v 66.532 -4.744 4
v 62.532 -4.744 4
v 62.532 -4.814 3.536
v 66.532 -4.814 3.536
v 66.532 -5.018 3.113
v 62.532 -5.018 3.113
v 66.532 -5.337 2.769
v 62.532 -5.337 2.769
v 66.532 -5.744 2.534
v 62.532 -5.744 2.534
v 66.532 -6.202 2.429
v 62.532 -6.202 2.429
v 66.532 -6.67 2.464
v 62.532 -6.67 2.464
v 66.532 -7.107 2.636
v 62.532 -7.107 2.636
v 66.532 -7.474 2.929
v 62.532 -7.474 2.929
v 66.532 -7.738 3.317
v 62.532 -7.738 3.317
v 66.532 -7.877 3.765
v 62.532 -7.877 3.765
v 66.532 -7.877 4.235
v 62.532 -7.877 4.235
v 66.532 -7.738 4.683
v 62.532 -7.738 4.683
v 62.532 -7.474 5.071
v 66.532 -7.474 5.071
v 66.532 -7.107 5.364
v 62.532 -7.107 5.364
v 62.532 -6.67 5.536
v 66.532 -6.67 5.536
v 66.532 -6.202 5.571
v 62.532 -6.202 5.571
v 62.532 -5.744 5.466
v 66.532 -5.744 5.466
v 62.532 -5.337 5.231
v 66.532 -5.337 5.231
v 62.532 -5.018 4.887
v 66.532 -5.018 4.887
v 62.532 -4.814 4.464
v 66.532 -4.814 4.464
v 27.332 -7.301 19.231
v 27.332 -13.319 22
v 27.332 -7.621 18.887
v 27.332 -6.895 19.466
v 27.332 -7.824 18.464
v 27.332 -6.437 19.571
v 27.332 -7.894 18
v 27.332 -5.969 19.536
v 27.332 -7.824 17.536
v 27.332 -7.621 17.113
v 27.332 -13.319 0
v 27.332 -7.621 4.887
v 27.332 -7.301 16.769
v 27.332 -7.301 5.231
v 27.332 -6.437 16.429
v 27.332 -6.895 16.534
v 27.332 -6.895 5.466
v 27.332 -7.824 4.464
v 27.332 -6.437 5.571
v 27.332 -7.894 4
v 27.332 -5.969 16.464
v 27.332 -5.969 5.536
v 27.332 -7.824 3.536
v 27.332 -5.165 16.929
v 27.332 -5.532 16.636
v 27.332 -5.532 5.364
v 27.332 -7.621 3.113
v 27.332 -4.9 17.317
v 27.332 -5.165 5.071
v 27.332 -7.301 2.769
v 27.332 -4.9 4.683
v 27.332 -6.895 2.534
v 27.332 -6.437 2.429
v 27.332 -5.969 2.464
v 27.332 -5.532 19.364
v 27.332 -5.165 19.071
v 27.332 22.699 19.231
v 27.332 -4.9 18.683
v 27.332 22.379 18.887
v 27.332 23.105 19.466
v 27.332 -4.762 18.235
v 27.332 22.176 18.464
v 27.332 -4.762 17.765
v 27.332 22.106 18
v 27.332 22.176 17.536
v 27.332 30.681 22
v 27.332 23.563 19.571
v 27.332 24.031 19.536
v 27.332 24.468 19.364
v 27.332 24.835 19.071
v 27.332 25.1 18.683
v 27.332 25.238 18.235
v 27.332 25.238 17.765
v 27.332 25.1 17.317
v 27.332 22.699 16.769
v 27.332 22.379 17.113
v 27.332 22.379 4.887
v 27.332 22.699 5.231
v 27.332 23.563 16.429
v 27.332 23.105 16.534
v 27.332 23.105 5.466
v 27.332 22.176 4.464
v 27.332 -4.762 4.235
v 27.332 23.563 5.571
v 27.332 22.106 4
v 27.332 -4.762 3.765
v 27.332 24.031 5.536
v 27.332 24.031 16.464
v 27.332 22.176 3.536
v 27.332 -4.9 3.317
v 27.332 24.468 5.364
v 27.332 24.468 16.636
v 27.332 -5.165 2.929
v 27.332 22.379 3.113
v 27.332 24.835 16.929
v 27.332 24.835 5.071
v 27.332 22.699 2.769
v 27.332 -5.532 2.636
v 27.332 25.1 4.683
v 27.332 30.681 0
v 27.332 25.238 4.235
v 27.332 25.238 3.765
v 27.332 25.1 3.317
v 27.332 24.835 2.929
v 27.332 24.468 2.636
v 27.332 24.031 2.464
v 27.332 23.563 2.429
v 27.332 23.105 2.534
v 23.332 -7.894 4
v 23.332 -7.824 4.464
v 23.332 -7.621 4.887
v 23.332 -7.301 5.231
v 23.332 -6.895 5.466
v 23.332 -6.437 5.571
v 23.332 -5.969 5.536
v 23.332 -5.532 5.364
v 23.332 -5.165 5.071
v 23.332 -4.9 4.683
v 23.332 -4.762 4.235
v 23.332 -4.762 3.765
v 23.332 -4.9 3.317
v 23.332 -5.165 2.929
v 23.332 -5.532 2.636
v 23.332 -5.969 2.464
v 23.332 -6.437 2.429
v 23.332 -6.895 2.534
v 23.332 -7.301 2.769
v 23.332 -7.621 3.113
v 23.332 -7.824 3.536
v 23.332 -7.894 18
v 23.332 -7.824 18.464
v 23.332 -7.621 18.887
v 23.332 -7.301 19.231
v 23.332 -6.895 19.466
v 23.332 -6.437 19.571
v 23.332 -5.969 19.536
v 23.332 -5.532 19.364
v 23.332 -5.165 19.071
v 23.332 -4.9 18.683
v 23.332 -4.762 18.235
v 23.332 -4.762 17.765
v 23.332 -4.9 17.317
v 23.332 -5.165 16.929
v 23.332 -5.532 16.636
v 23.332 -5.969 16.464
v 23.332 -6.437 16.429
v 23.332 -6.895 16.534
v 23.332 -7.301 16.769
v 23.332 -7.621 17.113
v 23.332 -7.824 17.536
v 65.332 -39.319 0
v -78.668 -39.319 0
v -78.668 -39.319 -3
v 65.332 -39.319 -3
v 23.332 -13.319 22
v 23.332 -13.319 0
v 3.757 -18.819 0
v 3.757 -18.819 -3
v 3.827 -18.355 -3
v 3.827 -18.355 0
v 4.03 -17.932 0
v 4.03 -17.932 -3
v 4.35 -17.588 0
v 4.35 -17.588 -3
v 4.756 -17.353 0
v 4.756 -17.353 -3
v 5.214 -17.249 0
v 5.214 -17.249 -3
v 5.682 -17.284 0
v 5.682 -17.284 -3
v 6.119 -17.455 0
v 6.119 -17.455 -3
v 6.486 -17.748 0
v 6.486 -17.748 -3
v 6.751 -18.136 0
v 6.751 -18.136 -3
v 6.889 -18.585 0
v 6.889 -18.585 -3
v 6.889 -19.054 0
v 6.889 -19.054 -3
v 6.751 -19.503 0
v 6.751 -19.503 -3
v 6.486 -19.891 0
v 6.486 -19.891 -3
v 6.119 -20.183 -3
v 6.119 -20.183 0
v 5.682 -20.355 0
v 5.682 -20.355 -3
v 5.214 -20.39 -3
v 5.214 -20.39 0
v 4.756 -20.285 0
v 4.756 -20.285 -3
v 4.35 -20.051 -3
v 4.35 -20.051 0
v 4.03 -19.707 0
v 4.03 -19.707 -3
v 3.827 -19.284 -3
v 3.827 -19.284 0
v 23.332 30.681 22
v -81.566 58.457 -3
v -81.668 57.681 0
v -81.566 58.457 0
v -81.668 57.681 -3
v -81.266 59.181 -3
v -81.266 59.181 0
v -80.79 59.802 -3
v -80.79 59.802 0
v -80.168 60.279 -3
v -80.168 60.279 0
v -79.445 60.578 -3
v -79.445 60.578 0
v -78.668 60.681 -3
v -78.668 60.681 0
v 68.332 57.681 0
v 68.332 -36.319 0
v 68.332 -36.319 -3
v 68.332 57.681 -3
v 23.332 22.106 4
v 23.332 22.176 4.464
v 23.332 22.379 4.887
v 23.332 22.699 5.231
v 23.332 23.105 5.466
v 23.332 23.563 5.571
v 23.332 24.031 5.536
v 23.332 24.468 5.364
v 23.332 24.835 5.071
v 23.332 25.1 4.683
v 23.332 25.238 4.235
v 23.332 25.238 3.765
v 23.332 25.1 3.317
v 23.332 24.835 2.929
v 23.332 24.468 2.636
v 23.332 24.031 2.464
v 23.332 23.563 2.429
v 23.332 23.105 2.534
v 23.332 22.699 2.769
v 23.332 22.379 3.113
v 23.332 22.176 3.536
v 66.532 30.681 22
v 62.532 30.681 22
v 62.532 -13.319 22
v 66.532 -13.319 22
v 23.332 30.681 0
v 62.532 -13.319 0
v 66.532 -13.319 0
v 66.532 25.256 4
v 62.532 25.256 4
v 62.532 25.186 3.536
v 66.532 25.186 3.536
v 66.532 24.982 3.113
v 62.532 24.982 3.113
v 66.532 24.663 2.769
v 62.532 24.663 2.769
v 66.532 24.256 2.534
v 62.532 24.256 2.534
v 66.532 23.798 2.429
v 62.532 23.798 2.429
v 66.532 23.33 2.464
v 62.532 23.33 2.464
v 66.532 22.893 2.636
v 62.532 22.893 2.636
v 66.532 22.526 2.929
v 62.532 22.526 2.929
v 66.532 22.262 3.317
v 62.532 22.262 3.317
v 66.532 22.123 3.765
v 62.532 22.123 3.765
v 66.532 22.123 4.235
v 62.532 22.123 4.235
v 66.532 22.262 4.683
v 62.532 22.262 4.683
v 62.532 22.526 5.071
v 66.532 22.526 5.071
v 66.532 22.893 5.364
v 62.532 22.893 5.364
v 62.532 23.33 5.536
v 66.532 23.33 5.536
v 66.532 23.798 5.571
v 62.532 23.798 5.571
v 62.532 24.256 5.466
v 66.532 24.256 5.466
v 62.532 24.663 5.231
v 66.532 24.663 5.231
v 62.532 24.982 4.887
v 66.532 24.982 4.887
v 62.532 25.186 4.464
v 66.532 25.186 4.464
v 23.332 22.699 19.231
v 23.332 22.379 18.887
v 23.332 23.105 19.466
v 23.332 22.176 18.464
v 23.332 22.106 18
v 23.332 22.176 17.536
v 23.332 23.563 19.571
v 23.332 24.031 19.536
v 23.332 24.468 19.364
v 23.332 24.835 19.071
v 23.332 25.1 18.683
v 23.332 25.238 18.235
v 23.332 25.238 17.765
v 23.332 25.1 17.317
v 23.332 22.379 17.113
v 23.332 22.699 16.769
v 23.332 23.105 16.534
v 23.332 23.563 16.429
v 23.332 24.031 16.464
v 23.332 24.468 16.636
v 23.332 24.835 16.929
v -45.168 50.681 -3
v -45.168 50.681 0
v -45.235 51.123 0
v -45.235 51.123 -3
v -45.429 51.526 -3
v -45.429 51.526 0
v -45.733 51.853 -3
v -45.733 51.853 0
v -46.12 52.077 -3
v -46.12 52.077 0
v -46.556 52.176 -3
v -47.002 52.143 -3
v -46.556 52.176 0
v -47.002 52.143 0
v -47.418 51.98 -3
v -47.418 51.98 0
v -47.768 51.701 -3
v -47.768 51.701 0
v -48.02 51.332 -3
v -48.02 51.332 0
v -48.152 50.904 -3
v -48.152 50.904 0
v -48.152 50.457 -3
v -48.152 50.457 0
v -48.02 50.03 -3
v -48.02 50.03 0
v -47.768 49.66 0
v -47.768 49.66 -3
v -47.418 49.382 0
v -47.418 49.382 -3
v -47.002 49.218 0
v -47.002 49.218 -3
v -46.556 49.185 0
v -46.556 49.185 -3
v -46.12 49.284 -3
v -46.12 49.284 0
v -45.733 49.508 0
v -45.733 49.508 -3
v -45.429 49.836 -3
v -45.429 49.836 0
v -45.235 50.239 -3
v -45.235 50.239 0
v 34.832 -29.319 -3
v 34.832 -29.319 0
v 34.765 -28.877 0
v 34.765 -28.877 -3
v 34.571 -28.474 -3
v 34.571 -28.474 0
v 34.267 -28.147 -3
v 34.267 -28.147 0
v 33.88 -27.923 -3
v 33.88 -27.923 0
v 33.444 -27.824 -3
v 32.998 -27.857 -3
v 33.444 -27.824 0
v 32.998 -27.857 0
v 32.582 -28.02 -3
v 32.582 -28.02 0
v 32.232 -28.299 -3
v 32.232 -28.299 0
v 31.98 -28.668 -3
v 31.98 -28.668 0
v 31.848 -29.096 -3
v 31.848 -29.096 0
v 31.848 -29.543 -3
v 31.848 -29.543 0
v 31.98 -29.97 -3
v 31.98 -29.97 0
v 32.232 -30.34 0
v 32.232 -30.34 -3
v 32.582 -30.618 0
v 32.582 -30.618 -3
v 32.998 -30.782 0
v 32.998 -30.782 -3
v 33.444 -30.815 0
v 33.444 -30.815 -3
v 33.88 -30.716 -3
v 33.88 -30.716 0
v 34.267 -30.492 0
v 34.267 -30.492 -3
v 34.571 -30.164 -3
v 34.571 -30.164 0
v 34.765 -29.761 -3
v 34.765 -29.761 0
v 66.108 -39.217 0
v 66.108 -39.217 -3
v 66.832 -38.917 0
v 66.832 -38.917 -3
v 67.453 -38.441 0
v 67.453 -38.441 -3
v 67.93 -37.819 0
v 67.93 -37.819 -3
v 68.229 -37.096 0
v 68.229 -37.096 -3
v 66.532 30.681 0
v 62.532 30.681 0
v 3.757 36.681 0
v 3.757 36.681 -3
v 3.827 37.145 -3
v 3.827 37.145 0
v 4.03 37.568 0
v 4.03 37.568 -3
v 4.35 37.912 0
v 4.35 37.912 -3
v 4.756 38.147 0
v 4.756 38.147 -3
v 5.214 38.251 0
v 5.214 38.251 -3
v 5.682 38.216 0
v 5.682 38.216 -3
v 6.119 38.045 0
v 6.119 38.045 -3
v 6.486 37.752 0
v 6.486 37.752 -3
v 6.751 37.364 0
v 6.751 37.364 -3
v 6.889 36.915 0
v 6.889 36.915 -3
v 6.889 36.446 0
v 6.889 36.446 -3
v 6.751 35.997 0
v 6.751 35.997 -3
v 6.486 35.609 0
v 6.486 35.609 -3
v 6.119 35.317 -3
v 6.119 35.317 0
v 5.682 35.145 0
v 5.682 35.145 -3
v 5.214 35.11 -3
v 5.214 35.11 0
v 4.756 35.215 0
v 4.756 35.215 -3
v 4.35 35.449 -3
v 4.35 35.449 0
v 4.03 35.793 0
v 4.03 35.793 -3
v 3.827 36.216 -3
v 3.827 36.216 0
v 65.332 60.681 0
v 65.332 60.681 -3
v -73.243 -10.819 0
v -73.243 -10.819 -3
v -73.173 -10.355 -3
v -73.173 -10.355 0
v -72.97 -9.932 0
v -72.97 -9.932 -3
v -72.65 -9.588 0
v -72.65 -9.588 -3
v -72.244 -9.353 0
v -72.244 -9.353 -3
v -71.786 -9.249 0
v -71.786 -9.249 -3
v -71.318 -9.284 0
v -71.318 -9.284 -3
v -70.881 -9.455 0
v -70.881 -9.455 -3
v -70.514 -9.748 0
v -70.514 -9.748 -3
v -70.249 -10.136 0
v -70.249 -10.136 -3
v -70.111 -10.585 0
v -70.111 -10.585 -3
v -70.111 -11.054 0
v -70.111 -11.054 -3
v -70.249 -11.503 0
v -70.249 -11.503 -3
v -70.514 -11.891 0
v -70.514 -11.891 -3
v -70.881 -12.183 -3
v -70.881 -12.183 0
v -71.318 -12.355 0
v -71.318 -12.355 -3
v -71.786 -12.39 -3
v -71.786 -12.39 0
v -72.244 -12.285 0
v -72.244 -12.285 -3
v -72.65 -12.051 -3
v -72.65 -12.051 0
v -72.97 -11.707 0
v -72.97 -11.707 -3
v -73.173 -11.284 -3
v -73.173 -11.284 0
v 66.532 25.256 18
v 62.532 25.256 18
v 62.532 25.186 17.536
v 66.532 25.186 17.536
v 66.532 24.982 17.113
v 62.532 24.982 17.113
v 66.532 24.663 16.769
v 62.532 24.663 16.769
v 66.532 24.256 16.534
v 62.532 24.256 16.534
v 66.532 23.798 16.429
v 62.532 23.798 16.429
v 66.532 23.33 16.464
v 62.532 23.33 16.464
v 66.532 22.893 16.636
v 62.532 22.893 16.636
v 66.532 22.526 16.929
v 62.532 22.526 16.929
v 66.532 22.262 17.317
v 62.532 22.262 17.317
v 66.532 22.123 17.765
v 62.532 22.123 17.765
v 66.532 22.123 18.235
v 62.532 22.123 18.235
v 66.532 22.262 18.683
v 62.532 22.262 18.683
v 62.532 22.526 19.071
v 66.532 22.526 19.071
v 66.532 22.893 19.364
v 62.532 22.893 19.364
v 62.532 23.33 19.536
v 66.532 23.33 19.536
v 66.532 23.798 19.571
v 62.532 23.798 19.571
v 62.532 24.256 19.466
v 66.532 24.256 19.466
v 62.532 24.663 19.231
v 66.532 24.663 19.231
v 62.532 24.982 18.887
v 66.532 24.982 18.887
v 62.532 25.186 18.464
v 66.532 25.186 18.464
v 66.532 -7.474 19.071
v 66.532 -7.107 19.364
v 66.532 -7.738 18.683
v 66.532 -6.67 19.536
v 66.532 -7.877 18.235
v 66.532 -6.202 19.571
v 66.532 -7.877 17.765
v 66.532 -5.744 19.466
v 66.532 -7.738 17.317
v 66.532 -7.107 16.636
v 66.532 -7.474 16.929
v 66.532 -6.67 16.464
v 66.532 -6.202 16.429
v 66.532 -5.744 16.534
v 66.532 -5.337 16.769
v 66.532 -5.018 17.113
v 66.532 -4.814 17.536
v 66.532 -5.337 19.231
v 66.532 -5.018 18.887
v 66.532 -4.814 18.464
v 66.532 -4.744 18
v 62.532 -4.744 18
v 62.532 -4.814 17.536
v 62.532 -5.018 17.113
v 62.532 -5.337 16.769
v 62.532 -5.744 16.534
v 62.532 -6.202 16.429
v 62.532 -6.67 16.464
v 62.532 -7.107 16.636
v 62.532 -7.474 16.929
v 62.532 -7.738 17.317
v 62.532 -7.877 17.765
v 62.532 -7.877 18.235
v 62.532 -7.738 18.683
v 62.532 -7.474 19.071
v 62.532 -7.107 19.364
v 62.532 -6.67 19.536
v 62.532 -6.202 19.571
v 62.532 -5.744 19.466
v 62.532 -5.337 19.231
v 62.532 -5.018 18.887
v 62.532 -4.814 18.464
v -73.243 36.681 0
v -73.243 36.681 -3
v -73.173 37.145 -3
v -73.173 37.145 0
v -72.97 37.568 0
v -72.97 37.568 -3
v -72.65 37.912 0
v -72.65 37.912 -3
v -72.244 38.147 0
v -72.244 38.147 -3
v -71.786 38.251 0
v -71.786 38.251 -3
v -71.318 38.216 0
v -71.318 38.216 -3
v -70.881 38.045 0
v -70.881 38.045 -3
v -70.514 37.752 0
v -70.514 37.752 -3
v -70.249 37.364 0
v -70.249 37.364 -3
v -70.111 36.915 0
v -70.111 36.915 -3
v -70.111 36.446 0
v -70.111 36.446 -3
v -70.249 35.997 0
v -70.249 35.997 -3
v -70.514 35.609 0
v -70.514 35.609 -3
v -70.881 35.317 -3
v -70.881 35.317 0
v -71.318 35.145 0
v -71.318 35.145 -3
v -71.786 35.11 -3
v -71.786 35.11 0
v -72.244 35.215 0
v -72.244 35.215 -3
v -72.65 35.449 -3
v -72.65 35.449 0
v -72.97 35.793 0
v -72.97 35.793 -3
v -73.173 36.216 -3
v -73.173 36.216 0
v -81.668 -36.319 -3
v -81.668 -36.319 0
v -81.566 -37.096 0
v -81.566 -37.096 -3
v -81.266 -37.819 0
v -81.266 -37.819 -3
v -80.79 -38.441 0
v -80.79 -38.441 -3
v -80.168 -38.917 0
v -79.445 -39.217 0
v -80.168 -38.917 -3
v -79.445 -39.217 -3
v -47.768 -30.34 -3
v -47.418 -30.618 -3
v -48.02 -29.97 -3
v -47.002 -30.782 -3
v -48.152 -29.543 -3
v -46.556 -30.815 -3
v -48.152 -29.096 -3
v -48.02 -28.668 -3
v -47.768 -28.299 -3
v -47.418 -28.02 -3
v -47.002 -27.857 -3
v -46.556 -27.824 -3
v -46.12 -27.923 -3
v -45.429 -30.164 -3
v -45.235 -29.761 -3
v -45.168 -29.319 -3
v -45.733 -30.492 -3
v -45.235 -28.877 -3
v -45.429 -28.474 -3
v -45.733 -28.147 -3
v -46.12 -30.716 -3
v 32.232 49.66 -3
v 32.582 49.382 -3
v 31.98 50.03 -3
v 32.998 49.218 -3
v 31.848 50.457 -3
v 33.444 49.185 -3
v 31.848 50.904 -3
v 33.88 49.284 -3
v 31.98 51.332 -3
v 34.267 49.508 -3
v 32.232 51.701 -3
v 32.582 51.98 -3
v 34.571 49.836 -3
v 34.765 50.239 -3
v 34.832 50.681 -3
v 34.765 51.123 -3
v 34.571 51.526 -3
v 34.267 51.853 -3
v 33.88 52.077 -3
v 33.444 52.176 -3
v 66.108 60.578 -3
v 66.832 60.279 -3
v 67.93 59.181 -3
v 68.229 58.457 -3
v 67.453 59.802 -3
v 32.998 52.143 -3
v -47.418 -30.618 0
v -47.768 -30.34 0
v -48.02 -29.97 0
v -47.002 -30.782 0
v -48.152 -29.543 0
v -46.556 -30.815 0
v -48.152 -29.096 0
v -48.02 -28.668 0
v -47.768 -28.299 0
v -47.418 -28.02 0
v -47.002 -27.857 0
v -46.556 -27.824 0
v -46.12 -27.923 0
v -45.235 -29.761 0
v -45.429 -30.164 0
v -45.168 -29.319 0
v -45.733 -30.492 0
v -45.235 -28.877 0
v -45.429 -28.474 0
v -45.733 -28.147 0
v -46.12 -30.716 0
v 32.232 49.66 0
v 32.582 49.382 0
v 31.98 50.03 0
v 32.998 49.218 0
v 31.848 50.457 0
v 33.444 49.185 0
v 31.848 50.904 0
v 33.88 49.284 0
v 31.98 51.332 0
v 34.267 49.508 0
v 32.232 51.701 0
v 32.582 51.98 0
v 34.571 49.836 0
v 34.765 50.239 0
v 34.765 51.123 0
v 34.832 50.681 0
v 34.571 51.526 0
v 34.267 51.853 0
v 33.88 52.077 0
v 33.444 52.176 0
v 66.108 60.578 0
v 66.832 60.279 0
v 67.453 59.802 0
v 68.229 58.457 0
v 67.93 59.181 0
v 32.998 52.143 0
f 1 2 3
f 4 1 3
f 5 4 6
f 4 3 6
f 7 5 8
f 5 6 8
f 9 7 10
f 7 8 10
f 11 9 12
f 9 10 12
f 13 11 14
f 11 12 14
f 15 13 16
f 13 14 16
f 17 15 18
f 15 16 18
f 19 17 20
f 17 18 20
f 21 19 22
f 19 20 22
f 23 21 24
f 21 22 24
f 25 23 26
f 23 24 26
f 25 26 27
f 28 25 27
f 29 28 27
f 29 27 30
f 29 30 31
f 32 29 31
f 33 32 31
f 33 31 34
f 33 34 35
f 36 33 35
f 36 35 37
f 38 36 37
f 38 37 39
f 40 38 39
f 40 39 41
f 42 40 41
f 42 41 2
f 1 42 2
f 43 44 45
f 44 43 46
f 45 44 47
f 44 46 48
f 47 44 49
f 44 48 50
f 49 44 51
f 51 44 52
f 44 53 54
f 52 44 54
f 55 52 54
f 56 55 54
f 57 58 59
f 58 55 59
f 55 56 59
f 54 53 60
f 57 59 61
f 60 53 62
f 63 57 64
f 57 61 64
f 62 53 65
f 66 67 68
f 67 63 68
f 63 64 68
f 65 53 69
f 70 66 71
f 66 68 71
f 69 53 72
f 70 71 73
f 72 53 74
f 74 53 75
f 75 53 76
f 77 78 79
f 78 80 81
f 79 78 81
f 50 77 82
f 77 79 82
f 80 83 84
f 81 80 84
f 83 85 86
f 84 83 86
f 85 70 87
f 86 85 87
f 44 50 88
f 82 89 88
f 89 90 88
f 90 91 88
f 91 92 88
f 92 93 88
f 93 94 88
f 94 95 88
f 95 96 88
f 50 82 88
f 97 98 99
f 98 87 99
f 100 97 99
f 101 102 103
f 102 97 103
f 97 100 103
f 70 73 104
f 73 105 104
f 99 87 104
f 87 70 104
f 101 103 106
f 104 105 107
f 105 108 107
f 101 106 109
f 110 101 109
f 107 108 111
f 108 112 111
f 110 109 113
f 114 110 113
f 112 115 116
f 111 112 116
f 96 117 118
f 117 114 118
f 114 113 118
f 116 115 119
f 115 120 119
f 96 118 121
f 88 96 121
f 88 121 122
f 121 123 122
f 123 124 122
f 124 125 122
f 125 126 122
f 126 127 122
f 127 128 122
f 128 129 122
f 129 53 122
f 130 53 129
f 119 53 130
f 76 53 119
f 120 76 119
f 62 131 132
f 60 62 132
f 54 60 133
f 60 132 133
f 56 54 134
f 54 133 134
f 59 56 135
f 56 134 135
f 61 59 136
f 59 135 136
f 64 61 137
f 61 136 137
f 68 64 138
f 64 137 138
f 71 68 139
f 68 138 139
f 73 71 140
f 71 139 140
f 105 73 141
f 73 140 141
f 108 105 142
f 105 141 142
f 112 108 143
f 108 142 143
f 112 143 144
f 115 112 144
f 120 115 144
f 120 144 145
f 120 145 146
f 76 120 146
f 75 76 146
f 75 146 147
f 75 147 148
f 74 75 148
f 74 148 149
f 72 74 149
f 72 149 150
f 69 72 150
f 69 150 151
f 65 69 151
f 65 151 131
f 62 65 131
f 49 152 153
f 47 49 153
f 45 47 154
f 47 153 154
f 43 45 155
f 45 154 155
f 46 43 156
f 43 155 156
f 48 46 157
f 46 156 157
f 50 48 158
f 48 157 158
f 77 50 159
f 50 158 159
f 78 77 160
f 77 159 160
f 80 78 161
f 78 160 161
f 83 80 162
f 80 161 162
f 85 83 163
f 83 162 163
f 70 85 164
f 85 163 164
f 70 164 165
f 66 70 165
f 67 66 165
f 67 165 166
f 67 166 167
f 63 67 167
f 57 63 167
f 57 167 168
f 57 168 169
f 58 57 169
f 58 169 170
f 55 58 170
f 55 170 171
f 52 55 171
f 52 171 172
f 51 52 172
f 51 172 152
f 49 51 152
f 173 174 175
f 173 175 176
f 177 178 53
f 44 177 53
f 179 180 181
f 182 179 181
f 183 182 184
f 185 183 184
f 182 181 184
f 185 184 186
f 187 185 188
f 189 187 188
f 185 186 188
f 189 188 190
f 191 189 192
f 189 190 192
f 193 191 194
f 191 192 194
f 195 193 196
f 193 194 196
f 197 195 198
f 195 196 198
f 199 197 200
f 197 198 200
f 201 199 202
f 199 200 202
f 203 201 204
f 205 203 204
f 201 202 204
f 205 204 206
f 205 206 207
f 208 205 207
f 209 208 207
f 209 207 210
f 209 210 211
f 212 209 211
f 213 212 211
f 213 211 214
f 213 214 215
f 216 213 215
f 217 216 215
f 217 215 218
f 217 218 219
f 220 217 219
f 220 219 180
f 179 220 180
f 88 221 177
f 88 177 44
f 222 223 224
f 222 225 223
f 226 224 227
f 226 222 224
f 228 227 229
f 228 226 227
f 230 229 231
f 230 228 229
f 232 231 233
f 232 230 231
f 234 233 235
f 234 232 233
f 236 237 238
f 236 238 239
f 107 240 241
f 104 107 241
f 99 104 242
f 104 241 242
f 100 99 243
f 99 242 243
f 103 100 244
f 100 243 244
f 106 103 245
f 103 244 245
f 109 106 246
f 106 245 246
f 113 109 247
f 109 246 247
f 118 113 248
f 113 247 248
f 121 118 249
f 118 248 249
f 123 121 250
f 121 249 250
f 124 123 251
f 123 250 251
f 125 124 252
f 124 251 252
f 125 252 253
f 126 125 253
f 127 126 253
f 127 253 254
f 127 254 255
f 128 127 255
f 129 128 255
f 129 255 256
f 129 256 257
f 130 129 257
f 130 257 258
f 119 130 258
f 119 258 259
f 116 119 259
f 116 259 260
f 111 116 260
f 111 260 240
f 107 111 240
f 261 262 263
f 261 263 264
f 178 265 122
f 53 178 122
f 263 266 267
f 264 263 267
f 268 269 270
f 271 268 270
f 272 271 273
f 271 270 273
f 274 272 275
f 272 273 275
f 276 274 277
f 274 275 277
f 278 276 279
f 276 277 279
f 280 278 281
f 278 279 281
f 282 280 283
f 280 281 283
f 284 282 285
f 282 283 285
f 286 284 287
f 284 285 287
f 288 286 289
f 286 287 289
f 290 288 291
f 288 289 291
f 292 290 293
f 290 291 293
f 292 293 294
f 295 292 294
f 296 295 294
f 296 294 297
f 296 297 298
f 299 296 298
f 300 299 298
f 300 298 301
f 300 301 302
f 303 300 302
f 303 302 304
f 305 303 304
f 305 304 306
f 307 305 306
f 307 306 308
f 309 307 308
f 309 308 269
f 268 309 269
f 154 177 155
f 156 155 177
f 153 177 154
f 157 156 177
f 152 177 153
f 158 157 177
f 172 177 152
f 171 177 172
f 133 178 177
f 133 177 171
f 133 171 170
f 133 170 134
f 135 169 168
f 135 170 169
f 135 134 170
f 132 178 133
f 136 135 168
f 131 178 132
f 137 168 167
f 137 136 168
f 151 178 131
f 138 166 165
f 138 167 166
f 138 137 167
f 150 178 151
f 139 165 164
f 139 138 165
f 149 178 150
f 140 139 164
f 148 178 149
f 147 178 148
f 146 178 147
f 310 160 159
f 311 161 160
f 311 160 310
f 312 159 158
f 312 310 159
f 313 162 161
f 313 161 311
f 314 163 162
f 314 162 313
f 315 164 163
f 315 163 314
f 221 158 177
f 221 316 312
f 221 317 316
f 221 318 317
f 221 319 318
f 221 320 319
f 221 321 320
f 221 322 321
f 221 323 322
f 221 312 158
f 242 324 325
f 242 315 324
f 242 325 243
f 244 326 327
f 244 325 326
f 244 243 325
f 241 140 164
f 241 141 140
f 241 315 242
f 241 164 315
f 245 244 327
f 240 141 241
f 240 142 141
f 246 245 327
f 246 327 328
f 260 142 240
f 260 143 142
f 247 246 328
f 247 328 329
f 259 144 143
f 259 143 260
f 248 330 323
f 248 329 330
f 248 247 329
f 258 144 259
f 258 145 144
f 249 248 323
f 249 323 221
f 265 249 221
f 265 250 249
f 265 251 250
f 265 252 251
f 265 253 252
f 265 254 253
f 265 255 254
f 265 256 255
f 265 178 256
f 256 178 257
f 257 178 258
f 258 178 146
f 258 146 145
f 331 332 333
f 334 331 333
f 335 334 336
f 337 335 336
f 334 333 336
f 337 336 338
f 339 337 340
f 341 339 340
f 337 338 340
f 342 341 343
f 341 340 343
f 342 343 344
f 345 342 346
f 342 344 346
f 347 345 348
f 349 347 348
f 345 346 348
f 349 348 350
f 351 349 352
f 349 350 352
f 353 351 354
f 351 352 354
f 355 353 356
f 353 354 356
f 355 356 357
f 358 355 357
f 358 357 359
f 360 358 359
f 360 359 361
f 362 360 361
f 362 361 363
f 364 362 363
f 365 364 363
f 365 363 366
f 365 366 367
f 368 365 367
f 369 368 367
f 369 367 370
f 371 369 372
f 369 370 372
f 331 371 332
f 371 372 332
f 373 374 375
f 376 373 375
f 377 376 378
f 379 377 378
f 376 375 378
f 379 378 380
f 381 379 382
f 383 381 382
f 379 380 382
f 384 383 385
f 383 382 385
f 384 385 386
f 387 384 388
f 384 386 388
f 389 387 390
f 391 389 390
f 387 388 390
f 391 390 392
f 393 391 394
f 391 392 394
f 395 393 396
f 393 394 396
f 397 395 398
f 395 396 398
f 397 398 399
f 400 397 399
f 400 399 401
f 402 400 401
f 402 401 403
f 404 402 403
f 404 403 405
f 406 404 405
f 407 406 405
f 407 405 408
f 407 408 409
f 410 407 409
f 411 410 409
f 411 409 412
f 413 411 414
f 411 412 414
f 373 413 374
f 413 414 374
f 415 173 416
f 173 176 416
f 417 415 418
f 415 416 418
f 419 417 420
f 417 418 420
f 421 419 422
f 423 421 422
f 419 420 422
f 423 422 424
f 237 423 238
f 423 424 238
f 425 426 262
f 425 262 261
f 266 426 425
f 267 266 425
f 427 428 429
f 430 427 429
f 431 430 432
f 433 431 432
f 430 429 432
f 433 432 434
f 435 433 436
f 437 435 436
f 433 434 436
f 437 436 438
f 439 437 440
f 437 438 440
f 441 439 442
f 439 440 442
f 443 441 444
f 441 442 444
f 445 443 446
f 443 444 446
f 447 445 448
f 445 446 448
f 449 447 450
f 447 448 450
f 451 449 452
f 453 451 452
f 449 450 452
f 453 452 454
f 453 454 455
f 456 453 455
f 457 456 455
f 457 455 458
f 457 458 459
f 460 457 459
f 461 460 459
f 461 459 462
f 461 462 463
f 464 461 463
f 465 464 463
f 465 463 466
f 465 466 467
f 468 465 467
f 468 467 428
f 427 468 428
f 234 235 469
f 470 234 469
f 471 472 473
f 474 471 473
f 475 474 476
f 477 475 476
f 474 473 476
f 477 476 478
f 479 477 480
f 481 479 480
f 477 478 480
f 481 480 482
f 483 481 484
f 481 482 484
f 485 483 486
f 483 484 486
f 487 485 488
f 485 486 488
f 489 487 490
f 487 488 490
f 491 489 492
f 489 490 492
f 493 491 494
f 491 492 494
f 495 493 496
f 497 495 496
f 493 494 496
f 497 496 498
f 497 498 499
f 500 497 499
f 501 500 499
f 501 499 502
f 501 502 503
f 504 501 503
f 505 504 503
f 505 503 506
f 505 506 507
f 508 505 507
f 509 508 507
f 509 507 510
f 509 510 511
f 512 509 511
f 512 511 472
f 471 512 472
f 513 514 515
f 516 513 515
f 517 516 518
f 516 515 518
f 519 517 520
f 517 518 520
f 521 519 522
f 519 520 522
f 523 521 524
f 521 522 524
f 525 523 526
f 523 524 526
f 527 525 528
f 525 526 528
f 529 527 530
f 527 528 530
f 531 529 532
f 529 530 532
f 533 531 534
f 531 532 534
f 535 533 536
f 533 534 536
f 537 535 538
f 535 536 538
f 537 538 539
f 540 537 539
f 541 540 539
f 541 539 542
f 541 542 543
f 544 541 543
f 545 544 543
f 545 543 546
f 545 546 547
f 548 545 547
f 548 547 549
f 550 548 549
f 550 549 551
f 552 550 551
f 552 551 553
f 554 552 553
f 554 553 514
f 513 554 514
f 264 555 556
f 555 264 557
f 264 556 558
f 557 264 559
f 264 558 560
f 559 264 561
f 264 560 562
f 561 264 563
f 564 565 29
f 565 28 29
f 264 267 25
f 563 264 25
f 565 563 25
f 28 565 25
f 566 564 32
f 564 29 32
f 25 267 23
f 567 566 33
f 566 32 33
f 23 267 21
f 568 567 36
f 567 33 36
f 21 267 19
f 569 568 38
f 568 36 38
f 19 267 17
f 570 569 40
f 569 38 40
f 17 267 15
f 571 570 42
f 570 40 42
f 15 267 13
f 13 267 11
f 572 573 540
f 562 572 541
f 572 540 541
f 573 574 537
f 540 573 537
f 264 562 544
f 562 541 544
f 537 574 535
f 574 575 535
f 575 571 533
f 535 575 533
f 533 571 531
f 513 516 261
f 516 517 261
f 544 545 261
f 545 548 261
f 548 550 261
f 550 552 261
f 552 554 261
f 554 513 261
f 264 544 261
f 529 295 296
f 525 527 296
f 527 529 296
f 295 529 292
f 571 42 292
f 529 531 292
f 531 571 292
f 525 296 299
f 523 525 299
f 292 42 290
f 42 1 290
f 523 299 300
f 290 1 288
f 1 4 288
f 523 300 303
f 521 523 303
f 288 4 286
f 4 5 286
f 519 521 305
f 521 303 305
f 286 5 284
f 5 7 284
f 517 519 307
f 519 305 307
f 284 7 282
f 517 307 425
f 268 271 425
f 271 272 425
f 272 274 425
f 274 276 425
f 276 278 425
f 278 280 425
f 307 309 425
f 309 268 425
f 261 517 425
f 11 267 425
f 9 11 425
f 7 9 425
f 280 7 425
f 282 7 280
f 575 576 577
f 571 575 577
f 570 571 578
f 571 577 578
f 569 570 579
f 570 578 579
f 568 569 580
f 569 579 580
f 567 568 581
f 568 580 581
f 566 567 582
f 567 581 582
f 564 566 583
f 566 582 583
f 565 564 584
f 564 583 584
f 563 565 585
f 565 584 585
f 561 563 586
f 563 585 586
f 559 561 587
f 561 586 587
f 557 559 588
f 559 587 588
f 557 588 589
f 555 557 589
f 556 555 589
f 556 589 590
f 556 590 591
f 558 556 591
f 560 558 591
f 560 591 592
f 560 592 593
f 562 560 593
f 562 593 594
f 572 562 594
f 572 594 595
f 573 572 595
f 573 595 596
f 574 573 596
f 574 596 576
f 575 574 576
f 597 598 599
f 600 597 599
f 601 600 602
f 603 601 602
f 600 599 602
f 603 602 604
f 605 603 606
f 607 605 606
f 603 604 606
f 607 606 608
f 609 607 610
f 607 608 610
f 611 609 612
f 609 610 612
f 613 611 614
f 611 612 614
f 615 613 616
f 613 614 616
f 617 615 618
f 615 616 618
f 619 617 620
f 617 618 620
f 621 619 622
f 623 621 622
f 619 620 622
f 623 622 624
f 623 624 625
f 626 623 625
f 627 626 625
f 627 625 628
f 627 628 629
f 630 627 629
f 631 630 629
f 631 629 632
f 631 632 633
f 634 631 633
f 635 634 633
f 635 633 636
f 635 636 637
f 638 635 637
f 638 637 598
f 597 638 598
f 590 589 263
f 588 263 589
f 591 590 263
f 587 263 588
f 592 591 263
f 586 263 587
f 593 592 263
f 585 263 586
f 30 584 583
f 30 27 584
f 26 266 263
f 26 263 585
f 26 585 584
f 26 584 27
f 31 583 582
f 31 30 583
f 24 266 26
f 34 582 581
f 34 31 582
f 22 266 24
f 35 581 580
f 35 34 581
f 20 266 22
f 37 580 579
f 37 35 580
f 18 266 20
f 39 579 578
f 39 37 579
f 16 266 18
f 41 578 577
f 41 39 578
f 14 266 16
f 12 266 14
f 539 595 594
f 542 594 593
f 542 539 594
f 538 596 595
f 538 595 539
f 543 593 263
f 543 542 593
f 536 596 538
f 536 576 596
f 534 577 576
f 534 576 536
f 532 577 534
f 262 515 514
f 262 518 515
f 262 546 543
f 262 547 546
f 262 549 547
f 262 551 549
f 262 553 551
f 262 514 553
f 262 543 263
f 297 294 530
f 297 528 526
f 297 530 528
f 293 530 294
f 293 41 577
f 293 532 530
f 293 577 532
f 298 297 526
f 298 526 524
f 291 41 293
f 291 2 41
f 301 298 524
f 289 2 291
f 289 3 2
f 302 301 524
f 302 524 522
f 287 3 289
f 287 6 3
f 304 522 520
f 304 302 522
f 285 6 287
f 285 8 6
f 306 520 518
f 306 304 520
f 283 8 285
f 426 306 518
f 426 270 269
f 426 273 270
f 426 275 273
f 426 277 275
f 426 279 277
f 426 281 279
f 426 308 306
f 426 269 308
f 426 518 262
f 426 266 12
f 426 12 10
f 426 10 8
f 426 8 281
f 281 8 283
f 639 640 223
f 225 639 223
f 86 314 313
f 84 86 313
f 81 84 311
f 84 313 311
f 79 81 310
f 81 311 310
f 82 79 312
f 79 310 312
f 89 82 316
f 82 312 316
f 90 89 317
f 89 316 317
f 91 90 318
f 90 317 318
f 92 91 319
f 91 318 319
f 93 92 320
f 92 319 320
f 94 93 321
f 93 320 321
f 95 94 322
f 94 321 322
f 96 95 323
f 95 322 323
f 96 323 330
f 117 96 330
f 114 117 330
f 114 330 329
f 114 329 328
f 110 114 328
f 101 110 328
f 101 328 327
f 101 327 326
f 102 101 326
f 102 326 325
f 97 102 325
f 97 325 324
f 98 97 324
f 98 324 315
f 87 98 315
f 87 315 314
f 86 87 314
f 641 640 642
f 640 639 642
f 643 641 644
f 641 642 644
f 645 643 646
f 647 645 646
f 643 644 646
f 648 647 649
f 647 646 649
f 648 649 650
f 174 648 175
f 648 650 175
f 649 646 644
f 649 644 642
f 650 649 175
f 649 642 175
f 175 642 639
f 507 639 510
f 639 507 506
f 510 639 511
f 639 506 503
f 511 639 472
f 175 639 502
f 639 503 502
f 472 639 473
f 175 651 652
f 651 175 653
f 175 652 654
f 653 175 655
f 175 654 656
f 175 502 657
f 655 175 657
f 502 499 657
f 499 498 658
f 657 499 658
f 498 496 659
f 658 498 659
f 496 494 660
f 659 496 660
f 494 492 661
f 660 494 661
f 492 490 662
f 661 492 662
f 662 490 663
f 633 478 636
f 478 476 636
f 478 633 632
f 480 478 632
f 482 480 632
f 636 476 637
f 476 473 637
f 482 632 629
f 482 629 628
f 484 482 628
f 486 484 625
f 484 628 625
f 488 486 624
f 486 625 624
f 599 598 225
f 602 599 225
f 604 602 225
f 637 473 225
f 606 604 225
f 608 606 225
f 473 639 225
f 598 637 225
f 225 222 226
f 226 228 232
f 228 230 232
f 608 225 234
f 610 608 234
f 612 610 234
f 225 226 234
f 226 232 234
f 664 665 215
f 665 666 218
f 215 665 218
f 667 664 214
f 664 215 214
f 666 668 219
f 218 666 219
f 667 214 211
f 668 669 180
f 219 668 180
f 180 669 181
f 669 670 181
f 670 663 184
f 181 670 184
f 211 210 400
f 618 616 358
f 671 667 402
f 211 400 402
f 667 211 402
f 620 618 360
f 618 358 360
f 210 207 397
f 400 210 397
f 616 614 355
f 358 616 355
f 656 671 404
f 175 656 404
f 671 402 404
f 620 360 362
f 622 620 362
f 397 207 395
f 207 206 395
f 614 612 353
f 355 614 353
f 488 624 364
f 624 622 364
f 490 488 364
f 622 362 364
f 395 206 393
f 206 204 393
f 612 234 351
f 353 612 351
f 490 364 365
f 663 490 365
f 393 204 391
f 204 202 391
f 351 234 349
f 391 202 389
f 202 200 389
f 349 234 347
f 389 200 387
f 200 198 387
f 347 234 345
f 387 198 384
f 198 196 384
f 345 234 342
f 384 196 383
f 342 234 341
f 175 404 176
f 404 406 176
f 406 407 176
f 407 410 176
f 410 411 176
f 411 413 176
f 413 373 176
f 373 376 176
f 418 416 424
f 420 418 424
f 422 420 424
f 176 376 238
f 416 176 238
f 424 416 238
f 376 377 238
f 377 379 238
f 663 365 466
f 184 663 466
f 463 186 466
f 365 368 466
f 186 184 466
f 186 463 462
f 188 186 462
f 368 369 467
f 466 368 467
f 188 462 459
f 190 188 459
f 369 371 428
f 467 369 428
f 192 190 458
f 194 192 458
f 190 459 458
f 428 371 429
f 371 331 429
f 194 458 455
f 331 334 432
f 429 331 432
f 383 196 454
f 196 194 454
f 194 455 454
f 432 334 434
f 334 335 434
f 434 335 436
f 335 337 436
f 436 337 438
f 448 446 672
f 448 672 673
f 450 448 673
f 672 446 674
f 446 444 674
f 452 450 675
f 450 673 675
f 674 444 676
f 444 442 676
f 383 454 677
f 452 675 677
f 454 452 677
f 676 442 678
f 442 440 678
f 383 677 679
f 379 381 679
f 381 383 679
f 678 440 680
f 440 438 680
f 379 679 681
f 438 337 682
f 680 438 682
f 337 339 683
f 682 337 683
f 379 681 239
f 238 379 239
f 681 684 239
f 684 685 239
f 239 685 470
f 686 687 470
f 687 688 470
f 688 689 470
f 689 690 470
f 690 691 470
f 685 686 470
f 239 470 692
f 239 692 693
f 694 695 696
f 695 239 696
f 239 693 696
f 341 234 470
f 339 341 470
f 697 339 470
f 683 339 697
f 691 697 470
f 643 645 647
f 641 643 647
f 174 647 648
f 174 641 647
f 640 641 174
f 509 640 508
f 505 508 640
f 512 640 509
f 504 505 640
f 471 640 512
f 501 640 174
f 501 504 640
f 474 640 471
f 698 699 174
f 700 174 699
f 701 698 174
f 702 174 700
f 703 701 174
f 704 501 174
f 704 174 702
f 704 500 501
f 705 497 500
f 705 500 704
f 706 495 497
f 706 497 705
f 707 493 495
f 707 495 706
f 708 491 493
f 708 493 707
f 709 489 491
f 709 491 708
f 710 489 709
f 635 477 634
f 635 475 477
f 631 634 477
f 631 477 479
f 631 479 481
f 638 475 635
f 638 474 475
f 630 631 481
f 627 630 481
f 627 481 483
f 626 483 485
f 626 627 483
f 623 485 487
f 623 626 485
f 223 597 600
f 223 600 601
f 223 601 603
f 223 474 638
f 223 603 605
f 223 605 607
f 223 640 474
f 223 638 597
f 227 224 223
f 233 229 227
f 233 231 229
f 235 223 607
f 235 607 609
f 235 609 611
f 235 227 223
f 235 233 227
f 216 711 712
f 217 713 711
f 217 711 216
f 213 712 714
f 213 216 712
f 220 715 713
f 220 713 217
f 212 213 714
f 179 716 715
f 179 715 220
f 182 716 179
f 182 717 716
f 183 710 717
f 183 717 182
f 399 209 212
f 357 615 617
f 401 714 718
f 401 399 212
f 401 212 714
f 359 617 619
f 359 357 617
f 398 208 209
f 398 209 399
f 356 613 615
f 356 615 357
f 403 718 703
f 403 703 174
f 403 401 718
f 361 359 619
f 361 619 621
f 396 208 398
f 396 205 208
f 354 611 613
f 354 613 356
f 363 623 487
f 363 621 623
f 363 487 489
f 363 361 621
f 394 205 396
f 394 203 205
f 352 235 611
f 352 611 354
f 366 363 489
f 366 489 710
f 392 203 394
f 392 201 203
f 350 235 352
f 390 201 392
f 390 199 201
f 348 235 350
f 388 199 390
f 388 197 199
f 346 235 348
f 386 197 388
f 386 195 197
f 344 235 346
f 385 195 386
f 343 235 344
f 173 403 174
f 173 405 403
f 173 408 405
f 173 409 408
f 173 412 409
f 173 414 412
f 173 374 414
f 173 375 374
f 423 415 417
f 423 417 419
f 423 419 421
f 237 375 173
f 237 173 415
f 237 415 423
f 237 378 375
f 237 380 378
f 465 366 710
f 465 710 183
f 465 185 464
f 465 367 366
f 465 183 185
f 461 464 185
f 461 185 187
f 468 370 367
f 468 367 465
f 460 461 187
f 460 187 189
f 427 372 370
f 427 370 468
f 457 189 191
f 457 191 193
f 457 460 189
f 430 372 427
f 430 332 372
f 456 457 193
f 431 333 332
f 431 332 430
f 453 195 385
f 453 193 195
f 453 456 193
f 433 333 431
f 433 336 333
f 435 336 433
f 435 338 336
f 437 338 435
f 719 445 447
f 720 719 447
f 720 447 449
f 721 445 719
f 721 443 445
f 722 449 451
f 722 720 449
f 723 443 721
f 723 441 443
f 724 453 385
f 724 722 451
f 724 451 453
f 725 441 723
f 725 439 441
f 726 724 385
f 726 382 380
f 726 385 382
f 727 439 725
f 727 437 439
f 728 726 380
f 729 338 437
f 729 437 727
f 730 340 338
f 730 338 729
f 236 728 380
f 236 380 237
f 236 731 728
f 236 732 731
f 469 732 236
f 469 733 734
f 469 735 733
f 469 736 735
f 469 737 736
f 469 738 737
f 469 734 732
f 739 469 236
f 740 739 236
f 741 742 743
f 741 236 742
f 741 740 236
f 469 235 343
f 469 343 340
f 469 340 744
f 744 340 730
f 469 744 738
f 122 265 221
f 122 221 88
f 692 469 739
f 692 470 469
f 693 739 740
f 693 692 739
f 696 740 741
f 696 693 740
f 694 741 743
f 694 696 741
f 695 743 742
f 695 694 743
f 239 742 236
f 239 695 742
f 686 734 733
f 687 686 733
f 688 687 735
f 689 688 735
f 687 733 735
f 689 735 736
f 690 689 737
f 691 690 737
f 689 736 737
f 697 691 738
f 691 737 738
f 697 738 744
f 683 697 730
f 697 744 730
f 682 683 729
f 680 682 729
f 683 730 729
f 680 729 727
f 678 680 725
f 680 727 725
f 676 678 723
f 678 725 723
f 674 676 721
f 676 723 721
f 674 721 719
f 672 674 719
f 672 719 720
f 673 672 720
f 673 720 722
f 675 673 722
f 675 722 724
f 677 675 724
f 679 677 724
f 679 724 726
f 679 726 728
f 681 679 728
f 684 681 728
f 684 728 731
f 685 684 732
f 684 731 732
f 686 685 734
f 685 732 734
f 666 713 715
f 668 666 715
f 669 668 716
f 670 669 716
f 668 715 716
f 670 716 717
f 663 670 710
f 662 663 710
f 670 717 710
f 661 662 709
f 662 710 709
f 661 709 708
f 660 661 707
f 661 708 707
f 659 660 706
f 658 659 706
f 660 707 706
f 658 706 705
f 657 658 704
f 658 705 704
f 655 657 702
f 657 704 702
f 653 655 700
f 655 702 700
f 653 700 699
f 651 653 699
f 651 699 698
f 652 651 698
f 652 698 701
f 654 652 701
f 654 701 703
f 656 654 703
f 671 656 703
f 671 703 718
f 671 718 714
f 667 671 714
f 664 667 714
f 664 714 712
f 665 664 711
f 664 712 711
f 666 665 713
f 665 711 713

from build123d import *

# Parameters (mm, degrees)
F1_W     = 4
F1_H     = 44
F2_DEPTH = 22
F0_W     = 150
F0_H     = 100
F0_R     = 1.5
F3_DEPTH = 3
F4_D     = 3.15
F5_D     = 3.15
F6_D     = 3.15
F7_D     = 3.15
F9_D     = 3.15
F9_DEPTH = 39.201
F10_R    = 3
F11_R    = 3
F12_D    = 3.15


with BuildPart() as f2:
    # F1 (on face) → F2 (new body)
    with BuildSketch(Plane.XY):
        with Locations((25.3316215873, 8.6806822121)):
            Rectangle(F1_W, F1_H)
    extrude(amount=F2_DEPTH)

    # F12 (through all)
    with Locations(Plane.YZ.offset(27.3316215873)):
        with Locations((23.6806822121, 18), (23.6806822121, 4), (-6.3193177879, 4), (-6.3193177879, 18)):
            Hole(F12_D / 2)


with BuildPart() as f2b:
    # F1 (on face) → F2, piece 2 (new body)
    with BuildSketch(Plane.XY):
        with Locations((64.5316215873, 8.6806822121)):
            Rectangle(F1_W, F1_H)
    extrude(amount=F2_DEPTH)

    # F9 (through all, one way)
    with BuildSketch(Plane(origin=(27.3316215873, 0, 0), x_dir=(0, 1, 0), z_dir=(-1, 0, 0))):
        with Locations((23.6806822121, -18), (23.6806822121, -4), (-6.3193177879, -18), (-6.3193177879, -4)):
            Circle(F9_D / 2)
    extrude(amount=-F9_DEPTH, mode=Mode.SUBTRACT)


with BuildPart() as f3:
    # F0 (on Top) → F3 (new body)
    with BuildSketch(Plane.XY):
        with Locations((-6.6683784127, 10.6806822121)):
            Rectangle(F0_W, F0_H)
        with Locations((-46.6683784127, -29.3193177879)):
            Circle(F0_R, mode=Mode.SUBTRACT)
        with Locations((33.3316215873, -29.3193177879)):
            Circle(F0_R, mode=Mode.SUBTRACT)
        with Locations((-46.6683784127, 50.6806822121)):
            Circle(F0_R, mode=Mode.SUBTRACT)
        with Locations((33.3316215873, 50.6806822121)):
            Circle(F0_R, mode=Mode.SUBTRACT)
    extrude(amount=-F3_DEPTH)

    # F4 (through all)
    with Locations(Plane.XY):
        with Locations((-71.6683784127, 36.6806822121)):
            Hole(F4_D / 2)

    # F5 (through all)
    with Locations(Plane.XY):
        with Locations((5.3316215873, 36.6806822121)):
            Hole(F5_D / 2)

    # F6 (through all)
    with Locations(Plane.XY):
        with Locations((-71.6683784127, -10.8193177879)):
            Hole(F6_D / 2)

    # F7 (through all)
    with Locations(Plane.XY):
        with Locations((5.3316215873, -18.8193177879)):
            Hole(F7_D / 2)

    # F10
    f10_edges = [f3.edges().sort_by_distance(p)[0] for p in [
        (-81.668378, 60.680682, -1.5),
    ]]
    fillet(f10_edges, radius=F10_R)

    # F11
    f11_edges = [f3.edges().sort_by_distance(p)[0] for p in [
        (-81.668378, -39.319318, -1.5),
        (68.331622, -39.319318, -1.5),
        (68.331622, 60.680682, -1.5),
    ]]
    fillet(f11_edges, radius=F11_R)


solid = Compound([f2.part, f2b.part, f3.part])
